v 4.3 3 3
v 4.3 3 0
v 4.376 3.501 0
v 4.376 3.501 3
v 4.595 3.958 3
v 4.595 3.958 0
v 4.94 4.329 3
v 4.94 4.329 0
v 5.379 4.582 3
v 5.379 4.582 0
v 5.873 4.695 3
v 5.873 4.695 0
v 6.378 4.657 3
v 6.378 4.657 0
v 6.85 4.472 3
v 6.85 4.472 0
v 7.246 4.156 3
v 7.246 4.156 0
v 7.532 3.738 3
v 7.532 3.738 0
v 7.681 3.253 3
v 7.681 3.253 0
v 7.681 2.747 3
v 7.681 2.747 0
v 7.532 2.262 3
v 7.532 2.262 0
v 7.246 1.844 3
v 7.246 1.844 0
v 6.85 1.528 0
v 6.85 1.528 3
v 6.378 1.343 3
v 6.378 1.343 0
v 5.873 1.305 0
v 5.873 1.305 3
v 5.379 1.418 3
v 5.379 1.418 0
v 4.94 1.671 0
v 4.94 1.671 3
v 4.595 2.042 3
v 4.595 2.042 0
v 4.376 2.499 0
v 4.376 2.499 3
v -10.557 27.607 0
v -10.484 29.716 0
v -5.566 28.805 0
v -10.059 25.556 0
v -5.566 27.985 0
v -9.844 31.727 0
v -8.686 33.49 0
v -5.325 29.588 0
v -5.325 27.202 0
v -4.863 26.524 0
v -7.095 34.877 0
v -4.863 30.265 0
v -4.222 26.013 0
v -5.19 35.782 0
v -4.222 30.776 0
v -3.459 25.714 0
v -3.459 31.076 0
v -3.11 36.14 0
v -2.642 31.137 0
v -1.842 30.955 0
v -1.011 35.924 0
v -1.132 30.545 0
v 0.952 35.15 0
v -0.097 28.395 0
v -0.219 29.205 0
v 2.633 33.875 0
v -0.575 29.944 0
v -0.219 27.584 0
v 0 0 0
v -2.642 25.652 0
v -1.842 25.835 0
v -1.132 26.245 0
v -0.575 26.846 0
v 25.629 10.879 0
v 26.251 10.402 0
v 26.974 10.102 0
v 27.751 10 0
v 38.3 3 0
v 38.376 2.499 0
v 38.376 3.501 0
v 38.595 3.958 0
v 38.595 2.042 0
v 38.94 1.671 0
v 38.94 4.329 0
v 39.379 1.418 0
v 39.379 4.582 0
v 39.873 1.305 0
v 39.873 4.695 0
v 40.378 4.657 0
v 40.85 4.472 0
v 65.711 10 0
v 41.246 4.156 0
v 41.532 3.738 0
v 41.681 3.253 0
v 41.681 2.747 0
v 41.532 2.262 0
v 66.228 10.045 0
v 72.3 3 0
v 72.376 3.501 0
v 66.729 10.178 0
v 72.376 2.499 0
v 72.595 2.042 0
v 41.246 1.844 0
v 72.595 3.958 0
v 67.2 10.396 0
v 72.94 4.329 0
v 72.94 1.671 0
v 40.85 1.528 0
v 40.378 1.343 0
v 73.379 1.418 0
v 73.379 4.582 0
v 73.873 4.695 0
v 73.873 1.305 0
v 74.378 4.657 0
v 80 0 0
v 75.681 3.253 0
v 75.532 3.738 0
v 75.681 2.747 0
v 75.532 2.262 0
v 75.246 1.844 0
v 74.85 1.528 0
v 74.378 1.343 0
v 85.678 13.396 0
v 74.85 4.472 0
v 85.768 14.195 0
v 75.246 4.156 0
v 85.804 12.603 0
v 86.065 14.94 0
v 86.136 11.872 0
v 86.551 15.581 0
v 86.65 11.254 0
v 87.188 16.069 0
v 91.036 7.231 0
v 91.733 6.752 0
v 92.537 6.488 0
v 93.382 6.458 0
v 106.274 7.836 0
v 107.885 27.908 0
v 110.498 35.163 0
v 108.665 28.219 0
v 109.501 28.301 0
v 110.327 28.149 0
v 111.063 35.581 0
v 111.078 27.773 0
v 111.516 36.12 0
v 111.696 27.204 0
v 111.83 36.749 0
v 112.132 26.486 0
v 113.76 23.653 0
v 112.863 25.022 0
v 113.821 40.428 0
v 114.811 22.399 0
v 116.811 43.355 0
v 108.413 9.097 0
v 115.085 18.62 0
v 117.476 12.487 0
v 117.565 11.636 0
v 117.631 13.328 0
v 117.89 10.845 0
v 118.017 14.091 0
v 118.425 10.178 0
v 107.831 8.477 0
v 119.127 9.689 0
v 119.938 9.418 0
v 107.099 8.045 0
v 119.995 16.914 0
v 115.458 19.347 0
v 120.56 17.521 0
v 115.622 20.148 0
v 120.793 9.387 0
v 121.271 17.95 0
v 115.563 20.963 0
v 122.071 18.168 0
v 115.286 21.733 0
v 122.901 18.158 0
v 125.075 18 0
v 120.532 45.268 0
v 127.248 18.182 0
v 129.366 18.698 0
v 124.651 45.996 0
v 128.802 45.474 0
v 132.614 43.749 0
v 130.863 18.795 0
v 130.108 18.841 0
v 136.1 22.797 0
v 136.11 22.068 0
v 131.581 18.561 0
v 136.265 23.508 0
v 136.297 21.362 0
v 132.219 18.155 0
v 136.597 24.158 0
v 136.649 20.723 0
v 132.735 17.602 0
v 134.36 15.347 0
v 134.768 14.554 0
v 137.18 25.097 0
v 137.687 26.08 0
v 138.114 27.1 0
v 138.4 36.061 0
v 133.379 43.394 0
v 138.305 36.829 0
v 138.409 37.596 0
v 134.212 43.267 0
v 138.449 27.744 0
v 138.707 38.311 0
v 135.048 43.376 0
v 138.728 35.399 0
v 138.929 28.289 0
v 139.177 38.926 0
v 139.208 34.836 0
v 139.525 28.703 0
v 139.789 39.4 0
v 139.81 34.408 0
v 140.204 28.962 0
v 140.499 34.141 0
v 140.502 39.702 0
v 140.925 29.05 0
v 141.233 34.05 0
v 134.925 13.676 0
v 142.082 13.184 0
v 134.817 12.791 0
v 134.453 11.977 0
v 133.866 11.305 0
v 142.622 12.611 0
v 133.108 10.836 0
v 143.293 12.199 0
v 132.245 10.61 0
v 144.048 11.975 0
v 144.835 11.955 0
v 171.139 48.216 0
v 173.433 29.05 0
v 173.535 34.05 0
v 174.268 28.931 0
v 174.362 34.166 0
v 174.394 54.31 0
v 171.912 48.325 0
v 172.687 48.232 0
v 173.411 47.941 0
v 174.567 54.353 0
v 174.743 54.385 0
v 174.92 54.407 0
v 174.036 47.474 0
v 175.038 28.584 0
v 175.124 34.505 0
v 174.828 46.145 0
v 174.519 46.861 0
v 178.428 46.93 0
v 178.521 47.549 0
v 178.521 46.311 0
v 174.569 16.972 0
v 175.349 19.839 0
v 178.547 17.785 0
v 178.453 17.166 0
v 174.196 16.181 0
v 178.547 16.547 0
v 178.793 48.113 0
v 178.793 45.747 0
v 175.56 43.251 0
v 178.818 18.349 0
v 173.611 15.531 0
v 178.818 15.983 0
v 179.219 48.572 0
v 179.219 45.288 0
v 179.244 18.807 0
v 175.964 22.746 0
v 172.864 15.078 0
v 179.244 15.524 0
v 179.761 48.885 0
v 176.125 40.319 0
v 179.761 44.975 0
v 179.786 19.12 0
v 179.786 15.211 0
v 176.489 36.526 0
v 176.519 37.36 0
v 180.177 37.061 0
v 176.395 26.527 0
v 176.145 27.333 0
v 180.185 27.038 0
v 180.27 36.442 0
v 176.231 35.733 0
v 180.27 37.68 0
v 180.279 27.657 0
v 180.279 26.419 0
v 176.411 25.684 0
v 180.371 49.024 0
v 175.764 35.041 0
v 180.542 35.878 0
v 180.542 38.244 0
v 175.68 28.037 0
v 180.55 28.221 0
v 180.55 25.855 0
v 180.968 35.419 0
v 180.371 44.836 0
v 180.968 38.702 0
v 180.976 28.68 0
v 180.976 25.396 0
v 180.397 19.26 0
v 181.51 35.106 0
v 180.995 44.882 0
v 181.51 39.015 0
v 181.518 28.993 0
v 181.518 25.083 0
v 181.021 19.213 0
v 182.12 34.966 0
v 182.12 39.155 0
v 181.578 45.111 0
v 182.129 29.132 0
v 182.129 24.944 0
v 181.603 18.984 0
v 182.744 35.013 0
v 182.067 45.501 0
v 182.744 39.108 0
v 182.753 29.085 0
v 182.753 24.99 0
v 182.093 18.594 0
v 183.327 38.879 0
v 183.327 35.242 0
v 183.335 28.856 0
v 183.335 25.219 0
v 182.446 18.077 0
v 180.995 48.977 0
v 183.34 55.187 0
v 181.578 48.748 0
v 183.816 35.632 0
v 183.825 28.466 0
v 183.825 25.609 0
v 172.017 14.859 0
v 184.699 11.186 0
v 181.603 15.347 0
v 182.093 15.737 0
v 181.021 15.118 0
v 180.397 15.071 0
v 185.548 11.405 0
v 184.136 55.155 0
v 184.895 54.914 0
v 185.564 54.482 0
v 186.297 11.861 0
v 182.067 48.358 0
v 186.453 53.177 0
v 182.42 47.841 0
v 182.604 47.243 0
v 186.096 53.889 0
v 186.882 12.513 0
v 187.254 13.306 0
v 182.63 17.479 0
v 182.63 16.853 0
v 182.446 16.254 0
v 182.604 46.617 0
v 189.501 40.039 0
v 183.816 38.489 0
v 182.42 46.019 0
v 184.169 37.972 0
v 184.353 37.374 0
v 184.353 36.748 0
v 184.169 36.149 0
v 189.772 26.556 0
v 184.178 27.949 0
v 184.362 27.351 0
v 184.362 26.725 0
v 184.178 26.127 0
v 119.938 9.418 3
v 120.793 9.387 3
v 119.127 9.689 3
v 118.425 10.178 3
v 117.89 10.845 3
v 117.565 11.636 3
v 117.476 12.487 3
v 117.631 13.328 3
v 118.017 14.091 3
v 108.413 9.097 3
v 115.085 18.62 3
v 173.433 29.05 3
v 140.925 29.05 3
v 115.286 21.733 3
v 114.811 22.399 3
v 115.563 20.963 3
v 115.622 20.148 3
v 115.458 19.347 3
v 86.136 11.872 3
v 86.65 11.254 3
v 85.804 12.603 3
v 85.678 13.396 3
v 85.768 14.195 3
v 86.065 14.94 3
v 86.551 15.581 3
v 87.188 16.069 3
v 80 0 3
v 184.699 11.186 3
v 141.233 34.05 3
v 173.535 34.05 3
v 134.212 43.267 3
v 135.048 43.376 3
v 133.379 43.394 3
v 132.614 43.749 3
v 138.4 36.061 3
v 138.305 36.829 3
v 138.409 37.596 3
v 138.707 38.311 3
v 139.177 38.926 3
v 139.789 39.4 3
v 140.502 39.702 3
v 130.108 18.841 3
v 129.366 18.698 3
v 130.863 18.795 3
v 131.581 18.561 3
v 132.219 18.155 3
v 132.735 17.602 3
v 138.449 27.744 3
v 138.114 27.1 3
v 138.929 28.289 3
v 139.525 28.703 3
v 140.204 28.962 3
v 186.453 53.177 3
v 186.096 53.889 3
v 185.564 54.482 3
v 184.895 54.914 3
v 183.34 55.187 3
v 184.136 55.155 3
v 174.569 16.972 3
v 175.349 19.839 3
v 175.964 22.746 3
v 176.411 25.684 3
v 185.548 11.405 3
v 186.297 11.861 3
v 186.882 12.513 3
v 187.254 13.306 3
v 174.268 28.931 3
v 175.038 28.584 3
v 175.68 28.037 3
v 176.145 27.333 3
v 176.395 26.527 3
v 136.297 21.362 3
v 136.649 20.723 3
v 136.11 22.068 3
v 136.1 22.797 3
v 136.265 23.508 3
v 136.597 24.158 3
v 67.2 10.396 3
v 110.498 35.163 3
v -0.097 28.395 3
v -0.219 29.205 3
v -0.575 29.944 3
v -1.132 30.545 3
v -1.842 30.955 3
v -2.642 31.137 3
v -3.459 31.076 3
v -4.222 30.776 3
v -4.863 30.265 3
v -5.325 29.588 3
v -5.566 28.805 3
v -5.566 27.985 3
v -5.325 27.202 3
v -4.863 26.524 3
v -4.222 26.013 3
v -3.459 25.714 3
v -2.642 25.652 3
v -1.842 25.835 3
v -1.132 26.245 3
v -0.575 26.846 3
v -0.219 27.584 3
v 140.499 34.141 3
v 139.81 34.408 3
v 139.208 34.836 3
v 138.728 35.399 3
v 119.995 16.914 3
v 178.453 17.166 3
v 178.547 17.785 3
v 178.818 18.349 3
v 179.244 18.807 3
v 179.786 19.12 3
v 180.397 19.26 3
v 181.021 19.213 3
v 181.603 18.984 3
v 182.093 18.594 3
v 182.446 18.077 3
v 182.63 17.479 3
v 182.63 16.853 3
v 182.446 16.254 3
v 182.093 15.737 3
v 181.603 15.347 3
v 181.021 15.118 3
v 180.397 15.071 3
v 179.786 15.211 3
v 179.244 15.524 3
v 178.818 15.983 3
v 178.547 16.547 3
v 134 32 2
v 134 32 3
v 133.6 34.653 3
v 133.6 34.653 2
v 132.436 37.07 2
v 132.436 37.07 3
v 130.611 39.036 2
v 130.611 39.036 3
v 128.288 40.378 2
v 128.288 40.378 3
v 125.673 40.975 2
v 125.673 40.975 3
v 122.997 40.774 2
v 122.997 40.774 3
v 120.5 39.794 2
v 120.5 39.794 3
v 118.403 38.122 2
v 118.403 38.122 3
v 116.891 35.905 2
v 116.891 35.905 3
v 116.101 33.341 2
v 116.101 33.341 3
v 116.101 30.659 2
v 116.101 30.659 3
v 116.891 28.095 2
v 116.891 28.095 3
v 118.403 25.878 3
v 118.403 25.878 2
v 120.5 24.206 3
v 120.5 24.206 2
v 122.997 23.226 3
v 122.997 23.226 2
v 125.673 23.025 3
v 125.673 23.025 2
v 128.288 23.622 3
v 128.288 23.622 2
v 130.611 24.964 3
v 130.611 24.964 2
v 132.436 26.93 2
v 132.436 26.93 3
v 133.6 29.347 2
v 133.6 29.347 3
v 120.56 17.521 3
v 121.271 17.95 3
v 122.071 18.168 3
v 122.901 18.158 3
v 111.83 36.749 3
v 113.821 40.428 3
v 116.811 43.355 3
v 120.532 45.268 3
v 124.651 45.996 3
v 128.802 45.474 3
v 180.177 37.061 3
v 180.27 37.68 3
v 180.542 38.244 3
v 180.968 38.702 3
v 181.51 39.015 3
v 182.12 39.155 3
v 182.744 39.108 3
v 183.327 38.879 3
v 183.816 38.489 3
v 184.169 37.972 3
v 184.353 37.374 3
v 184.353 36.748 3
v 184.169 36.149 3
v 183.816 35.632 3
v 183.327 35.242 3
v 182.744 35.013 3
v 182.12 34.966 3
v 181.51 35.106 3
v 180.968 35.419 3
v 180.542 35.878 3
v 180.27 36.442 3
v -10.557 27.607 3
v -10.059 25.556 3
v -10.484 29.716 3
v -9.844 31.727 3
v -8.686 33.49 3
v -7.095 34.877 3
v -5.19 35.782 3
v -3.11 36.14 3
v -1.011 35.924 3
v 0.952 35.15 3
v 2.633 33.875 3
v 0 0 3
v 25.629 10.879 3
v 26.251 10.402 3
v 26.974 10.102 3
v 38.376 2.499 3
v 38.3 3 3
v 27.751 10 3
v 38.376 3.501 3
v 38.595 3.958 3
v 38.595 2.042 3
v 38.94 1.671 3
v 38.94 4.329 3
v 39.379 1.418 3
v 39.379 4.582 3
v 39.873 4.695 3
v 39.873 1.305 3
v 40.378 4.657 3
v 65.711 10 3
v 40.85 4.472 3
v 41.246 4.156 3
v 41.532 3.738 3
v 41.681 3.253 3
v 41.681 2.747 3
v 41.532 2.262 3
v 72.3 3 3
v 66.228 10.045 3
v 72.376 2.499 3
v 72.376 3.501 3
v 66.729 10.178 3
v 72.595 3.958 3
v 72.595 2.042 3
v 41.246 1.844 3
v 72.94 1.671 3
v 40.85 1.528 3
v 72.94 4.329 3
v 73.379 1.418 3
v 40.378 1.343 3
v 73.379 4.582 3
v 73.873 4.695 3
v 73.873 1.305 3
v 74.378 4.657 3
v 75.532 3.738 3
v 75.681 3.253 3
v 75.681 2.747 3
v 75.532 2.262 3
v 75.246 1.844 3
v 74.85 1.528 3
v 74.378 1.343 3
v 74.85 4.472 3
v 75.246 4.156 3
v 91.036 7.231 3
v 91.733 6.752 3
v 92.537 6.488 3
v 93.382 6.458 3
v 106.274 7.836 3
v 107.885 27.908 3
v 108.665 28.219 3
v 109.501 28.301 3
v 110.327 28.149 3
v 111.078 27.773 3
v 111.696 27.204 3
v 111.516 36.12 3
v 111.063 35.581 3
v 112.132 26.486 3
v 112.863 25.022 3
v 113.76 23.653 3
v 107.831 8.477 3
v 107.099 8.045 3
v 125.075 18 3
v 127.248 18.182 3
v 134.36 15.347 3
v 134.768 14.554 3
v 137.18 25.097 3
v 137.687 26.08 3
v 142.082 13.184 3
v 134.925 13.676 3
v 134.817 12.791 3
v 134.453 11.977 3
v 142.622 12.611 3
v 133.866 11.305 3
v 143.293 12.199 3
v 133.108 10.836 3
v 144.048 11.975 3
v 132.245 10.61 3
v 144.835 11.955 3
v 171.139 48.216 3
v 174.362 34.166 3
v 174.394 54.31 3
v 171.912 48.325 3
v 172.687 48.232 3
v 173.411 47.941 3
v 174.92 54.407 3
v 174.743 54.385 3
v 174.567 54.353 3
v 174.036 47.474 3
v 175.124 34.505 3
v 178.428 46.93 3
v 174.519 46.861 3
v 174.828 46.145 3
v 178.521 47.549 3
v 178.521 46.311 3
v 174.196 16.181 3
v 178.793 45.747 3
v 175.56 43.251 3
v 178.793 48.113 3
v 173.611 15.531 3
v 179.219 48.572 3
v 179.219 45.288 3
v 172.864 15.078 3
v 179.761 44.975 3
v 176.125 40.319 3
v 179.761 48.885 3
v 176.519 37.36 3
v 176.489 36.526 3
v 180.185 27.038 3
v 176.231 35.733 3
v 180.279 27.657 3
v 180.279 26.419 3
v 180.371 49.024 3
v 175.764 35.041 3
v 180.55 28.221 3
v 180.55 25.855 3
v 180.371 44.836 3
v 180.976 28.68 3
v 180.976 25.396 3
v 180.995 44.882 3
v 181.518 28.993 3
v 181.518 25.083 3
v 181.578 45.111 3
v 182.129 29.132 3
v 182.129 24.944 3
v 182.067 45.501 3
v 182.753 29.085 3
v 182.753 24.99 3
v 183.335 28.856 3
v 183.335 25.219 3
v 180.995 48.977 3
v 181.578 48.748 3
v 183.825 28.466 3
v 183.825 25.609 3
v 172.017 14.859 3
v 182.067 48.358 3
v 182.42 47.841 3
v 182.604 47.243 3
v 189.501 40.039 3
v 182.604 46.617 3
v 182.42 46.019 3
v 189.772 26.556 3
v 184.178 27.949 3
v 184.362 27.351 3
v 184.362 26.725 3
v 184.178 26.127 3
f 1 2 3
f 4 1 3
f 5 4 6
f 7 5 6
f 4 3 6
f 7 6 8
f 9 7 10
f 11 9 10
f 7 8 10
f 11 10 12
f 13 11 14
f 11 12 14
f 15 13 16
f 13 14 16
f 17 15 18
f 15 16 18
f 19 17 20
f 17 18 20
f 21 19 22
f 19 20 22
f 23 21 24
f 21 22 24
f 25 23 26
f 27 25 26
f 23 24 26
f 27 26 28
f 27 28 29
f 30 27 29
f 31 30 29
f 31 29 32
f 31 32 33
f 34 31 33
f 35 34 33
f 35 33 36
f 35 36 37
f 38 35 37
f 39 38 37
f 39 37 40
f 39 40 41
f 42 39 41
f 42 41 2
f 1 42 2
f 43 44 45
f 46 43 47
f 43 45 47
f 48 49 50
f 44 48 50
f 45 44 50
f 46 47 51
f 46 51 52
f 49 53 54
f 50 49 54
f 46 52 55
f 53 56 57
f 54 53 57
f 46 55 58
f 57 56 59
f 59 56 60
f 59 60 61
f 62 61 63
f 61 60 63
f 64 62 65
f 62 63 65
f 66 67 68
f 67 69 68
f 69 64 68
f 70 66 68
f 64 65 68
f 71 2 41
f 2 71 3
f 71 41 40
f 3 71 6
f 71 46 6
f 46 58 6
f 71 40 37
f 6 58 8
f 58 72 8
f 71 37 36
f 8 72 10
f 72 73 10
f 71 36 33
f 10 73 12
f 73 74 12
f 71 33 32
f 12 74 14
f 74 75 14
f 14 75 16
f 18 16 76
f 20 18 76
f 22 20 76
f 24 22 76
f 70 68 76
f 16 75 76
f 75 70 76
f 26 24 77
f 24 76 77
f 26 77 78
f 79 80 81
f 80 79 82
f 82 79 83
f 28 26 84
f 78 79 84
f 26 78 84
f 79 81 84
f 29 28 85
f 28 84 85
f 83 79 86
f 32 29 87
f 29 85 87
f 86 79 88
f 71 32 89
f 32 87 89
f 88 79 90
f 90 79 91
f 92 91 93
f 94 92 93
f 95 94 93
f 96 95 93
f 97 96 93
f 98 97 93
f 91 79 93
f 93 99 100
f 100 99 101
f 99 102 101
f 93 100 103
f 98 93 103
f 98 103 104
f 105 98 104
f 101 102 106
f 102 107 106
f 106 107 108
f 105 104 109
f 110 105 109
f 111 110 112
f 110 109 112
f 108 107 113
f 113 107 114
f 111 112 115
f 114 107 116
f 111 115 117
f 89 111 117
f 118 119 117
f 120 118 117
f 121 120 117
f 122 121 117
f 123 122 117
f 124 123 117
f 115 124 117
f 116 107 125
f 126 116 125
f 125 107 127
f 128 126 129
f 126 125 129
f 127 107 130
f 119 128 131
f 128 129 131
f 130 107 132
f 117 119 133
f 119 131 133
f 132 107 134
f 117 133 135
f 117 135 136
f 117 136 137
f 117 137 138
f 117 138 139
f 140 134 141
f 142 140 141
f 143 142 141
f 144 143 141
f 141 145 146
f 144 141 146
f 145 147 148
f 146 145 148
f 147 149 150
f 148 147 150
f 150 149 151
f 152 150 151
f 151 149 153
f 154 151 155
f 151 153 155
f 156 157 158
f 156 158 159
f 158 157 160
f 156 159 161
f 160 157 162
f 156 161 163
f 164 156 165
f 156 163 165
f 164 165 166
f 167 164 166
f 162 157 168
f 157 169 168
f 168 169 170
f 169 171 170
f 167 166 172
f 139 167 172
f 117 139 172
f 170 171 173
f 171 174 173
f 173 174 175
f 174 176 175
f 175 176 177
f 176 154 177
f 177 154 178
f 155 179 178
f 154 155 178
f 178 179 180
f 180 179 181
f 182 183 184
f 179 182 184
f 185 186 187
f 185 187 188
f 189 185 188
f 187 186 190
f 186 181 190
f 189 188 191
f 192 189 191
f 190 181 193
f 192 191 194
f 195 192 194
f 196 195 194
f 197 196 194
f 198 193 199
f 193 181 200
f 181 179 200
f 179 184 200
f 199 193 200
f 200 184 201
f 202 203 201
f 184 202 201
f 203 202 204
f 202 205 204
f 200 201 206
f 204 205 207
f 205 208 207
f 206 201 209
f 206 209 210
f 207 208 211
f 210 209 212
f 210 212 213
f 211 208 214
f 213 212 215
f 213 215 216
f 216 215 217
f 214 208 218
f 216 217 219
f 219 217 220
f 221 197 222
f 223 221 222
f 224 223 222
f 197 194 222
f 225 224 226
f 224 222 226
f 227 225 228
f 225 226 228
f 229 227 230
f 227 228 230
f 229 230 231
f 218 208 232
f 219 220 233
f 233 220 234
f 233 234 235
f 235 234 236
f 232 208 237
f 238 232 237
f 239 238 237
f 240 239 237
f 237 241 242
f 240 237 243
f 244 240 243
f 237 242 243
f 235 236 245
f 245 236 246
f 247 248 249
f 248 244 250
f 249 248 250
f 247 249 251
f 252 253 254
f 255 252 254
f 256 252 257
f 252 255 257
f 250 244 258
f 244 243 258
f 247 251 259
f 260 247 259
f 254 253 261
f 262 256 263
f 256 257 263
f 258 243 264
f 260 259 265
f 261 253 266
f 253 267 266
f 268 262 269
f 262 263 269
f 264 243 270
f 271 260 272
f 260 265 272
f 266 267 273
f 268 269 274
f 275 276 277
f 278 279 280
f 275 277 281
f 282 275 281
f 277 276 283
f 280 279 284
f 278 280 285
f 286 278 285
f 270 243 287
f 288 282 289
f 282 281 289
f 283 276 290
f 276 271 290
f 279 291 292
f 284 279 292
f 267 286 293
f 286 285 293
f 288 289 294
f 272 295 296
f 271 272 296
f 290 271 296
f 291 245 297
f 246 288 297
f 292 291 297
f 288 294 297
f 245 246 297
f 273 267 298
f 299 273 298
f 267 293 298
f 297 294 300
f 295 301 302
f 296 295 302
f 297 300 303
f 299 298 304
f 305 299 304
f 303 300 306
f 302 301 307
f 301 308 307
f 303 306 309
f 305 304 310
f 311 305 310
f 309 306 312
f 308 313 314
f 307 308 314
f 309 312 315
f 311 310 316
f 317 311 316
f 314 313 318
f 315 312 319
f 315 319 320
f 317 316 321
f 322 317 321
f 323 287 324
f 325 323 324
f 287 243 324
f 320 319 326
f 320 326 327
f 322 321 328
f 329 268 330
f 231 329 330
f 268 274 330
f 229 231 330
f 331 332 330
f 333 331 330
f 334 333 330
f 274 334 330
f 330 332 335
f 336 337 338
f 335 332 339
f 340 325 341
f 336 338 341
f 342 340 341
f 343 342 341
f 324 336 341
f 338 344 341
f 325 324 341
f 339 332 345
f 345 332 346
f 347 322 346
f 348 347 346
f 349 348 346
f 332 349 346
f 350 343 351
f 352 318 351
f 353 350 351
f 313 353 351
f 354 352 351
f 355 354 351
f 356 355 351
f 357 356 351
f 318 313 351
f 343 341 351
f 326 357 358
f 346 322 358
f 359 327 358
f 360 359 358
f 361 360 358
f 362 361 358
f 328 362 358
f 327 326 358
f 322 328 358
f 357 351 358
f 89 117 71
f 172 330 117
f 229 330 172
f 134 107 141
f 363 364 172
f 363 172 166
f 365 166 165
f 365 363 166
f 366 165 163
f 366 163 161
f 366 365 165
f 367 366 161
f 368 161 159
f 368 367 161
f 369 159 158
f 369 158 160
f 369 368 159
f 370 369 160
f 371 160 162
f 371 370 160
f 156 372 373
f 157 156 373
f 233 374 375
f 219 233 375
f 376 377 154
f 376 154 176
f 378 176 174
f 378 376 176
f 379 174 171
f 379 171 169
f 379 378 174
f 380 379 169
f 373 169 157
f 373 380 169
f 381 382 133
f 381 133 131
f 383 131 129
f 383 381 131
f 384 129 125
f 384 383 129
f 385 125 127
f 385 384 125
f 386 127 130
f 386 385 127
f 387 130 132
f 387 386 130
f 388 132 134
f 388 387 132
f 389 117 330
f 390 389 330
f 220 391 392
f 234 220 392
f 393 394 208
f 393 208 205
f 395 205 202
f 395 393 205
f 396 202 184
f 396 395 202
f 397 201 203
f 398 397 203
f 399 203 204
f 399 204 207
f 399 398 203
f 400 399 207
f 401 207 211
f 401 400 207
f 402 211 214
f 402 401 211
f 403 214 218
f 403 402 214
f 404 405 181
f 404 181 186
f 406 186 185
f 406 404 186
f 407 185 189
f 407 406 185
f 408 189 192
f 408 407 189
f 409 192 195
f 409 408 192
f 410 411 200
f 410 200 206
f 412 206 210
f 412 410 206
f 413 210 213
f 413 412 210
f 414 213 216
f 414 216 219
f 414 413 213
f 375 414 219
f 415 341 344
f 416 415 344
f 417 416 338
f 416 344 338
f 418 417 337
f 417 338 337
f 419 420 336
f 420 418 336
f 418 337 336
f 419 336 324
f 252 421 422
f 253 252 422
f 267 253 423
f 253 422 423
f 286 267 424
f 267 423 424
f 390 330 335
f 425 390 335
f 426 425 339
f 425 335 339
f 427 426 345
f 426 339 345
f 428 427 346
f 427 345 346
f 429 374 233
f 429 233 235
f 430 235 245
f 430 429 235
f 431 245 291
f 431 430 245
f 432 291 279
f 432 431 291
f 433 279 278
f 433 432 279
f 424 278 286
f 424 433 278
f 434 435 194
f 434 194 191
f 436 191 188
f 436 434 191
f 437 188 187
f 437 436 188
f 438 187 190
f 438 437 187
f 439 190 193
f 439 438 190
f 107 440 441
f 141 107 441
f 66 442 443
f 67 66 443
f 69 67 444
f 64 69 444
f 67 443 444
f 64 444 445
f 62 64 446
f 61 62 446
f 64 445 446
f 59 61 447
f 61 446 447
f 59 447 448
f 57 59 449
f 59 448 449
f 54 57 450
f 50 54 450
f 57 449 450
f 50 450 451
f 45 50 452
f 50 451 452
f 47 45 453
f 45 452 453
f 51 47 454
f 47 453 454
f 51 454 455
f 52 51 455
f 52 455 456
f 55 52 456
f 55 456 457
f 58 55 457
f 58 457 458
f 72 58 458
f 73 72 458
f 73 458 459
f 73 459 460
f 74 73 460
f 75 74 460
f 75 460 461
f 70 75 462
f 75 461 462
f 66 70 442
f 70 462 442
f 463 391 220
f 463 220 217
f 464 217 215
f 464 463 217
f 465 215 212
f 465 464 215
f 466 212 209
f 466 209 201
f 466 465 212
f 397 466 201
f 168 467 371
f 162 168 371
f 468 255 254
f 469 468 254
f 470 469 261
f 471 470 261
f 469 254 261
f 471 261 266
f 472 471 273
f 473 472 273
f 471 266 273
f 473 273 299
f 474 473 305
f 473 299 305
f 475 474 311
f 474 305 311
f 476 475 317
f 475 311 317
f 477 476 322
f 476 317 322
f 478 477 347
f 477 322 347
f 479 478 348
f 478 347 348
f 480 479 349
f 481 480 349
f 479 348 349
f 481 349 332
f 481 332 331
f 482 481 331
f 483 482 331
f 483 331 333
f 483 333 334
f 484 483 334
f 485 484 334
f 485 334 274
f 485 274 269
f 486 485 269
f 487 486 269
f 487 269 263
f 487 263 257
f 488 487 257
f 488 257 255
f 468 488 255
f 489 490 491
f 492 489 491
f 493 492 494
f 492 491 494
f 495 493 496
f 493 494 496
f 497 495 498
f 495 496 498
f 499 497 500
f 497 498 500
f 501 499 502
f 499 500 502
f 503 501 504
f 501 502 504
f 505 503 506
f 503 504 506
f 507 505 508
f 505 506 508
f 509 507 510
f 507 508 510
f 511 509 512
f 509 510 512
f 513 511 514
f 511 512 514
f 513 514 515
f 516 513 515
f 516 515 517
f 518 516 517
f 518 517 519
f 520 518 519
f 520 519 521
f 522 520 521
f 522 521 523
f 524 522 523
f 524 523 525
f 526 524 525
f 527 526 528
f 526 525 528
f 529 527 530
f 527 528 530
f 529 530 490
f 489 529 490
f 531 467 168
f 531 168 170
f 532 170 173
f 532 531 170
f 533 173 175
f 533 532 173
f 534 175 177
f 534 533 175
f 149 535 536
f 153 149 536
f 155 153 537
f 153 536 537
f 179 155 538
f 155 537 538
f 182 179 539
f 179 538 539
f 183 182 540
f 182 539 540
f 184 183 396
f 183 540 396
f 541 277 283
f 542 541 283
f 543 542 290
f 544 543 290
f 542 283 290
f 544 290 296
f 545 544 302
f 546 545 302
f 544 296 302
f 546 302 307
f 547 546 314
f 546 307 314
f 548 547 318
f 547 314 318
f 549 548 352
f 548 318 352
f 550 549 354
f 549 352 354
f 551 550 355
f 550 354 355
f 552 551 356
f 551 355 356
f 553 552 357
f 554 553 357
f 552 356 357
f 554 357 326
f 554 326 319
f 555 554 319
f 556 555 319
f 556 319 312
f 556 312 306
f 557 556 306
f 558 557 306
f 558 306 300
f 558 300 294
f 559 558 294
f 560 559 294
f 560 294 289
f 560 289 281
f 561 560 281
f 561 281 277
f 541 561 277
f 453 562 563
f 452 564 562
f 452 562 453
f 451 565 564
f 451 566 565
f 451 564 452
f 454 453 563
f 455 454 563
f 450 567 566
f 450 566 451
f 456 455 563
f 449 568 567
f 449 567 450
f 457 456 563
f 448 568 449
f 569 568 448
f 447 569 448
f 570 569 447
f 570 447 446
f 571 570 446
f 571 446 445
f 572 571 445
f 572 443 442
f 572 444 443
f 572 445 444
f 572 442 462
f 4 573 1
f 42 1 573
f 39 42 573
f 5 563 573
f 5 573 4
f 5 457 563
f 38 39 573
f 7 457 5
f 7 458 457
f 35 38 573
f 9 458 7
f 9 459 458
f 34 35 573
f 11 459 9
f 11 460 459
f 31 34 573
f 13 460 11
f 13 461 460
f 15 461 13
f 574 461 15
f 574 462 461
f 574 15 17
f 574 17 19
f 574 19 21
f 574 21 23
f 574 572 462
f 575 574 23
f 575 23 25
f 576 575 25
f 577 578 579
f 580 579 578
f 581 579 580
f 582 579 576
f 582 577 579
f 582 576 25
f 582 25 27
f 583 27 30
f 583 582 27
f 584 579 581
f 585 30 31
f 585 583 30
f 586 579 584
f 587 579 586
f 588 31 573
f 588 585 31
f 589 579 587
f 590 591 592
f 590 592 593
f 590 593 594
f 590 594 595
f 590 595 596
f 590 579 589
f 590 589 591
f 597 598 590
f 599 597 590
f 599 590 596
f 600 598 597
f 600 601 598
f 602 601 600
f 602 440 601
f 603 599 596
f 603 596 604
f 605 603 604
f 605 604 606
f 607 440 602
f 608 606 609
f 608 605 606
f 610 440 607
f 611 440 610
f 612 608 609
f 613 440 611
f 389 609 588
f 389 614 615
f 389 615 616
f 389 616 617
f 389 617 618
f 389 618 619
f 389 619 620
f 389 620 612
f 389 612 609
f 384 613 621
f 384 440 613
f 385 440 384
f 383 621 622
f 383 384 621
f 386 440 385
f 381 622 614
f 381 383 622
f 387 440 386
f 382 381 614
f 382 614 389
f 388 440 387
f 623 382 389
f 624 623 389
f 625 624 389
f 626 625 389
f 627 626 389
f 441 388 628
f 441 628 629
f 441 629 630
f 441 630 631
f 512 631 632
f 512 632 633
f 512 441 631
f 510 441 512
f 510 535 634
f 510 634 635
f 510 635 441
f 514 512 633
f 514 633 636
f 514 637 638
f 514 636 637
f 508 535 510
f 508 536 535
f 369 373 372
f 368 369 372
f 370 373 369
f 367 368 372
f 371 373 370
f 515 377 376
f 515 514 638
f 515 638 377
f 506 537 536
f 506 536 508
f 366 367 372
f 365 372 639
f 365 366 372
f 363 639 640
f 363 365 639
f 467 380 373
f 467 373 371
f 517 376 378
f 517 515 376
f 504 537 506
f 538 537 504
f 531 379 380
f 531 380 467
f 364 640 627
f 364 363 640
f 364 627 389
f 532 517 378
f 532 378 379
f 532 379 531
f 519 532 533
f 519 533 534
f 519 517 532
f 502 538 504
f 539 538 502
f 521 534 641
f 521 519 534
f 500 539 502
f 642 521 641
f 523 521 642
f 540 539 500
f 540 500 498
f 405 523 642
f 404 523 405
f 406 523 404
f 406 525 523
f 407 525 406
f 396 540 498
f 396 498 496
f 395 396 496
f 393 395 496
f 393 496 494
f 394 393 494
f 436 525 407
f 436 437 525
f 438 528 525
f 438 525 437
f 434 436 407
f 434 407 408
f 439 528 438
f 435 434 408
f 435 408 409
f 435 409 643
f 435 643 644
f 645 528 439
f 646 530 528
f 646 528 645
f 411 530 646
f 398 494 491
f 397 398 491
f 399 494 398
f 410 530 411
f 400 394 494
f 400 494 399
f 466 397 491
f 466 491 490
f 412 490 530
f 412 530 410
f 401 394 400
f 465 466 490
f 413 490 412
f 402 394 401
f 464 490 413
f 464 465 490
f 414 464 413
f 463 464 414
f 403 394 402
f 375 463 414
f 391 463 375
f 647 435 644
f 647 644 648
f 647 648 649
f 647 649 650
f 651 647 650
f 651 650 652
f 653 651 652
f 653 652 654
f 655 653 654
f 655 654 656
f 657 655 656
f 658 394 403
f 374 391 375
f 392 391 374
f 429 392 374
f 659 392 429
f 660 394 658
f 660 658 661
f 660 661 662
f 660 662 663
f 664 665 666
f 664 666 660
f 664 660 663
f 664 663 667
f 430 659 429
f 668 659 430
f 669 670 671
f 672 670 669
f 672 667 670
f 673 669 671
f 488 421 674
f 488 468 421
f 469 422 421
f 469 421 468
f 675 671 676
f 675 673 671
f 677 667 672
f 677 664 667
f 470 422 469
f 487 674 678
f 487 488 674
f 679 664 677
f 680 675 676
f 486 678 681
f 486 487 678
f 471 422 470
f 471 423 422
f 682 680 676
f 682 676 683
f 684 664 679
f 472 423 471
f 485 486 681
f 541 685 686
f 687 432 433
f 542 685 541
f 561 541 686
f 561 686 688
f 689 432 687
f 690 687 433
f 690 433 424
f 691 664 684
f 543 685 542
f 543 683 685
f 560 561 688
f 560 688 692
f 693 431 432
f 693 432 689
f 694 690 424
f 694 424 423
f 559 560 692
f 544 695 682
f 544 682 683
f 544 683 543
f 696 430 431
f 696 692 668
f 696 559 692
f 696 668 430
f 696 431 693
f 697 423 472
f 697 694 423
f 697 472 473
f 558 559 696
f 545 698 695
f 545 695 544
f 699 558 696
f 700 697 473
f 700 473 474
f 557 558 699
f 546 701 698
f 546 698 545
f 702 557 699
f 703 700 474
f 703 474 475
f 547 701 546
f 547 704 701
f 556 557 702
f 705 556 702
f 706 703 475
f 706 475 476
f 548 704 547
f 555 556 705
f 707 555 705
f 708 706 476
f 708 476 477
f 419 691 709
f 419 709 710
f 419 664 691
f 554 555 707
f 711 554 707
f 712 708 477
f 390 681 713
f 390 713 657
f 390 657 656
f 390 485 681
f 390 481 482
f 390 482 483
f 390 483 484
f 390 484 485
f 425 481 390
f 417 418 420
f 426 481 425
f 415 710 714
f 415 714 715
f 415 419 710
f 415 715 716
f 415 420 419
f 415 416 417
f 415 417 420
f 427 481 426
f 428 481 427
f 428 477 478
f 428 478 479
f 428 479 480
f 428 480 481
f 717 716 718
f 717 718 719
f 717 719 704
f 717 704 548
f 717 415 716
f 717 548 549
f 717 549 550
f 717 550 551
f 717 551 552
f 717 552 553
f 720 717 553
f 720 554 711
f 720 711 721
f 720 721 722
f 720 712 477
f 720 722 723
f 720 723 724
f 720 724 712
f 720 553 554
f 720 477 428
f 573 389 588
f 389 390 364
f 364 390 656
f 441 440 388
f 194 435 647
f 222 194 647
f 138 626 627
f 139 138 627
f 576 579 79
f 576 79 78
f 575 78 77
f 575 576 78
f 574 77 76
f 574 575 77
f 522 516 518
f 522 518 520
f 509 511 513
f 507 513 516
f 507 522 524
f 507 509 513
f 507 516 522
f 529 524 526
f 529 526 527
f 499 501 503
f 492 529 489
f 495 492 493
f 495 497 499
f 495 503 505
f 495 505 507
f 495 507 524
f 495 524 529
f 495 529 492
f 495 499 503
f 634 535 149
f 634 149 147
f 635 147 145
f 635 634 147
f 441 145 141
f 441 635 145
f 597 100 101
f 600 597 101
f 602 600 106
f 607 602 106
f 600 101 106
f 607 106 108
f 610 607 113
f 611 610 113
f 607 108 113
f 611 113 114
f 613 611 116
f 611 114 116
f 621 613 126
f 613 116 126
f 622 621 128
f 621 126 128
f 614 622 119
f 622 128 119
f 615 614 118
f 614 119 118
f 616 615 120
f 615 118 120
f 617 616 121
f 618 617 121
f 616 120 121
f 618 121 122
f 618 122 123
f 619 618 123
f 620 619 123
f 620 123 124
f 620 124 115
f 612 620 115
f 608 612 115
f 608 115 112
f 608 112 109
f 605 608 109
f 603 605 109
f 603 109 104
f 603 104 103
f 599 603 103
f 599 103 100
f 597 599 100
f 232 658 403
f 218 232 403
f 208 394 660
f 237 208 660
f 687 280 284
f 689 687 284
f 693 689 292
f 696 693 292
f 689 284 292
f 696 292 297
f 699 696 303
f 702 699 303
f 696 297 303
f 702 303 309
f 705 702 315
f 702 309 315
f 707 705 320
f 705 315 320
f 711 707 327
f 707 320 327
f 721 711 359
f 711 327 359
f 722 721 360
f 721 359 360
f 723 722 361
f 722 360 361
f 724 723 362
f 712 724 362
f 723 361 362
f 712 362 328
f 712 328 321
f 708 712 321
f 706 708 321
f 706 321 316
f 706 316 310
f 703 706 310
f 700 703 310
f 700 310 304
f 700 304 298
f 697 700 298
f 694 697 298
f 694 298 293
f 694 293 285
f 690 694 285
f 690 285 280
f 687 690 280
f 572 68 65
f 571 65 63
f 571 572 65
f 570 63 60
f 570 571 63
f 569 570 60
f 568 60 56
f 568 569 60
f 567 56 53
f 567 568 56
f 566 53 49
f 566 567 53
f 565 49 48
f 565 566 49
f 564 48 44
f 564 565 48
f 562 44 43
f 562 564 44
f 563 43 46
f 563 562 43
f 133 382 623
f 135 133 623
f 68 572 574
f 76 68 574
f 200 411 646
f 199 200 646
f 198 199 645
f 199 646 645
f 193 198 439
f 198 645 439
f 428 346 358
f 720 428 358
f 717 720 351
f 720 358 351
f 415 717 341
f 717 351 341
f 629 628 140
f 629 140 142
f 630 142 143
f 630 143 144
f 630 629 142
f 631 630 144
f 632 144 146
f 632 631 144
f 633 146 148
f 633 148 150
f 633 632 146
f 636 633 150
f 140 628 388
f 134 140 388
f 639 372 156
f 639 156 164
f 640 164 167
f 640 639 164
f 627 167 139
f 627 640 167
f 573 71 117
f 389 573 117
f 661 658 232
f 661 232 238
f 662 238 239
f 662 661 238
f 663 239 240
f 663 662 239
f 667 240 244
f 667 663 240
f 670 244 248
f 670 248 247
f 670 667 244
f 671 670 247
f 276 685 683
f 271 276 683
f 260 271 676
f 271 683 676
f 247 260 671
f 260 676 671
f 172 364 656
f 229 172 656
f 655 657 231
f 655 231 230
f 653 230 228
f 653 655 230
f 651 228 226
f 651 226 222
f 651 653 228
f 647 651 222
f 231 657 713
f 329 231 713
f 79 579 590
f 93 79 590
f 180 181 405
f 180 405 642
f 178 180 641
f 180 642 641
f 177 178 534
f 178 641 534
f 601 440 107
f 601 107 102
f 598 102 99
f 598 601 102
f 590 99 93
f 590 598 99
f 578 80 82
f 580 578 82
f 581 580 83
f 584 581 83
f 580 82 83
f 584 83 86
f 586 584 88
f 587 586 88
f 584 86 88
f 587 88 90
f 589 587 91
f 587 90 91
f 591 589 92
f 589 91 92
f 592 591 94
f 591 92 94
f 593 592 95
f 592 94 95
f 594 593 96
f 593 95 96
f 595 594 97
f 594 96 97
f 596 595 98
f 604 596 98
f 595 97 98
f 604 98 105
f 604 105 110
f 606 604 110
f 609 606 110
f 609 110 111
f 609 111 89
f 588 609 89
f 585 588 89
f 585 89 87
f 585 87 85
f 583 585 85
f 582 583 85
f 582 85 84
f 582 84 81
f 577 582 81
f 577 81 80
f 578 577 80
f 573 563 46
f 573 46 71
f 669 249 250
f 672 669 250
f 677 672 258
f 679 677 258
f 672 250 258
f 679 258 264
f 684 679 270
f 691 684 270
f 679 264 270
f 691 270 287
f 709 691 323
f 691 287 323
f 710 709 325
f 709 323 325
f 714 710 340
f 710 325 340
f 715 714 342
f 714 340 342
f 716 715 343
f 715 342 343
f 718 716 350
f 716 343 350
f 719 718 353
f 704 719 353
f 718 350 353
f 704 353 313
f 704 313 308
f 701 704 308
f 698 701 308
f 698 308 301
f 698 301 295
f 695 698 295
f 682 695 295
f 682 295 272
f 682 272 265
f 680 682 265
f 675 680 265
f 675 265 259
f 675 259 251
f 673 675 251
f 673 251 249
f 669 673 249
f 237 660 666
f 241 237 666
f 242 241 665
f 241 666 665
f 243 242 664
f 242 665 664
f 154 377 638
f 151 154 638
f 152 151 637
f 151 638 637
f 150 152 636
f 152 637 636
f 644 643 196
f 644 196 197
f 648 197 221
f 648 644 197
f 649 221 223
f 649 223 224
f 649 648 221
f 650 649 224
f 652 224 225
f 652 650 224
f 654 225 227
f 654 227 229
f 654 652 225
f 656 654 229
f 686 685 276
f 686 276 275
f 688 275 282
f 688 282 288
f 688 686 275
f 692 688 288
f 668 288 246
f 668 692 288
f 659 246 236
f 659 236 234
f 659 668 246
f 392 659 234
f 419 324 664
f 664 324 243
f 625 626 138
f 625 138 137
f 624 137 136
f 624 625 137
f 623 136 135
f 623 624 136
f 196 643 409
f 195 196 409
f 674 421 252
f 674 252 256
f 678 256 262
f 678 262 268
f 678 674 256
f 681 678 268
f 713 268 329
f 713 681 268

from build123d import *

# Parameters (mm, degrees)
EXTRUDE_1_DEPTH     = 3
HOLE_WIZARD_M31_D   = 3.4
SKETCH_5_R          = 2.749999999999999
EXTRUDE_2_DEPTH     = 3
CUT_EXTRUDE_1_DEPTH = 198.9348007797117
M5X0_81_D           = 4.2
CUT_EXTRUDE_2_DEPTH = 198.9348007797117
CUT_EXTRUDE_3_DEPTH = 198.9348007797117
FILLET_1_R          = 3
SKETCH_12_R         = 8.999999999999996
CUT_EXTRUDE_4_DEPTH = 1


with BuildPart() as part:
    # Эскиз1 → Бобышка-Вытянуть1 (new body)
    with BuildSketch(Plane.XY):
        with BuildLine():
            Line((0, 0), (80, 0))
            Line((80, 0), (186.64735263363326, 11.394080625595256))
            ThreePointArc((186.64735263363326, 11.394080625595256), (189.98303763522418, 33.48486352875775), (185.64181138843185, 55.40022887772366))
            Line((185.64181138843185, 55.40022887772366), (29.81788185582472, 40.959090919498855))
            Line((29.81788185582472, 40.959090919498855), (1.6e-16, 40.959090919498855))
            Line((1.6e-16, 40.959090919498855), (0, 0))
        make_face()
    extrude(amount=EXTRUDE_1_DEPTH)

    # Отверстие с зазором M31 (through all)
    with Locations(Plane.XY.offset(3)):
        with Locations((6, 3), (40, 3), (74, 3)):
            Hole(HOLE_WIZARD_M31_D / 2)

    # Эскиз5 → Бобышка-Вытянуть2 (add)
    with BuildSketch(Plane.XY.offset(3)):
        with BuildLine():
            Line((-10.05858051013897, 25.55645888767347), (0, 0))
            Line((0, 0), (0, 21.18668565496398))
            ThreePointArc((0, 21.18668565496398), (0.24099496955508215, 35.503000018294074), (-10.05858051013897, 25.55645888767347))
        make_face()
        with Locations((-2.8470386460772503, 28.39479712384004)):
            Circle(SKETCH_5_R, mode=Mode.SUBTRACT)
    extrude(amount=-EXTRUDE_2_DEPTH)

    # Эскиз6 → Вырез-Вытянуть1 (cut, through all)
    with BuildSketch(Plane.XY.offset(3)):
        with BuildLine():
            Line((2.6330389081184924, 33.874874678035766), (26.507913586154185, 10.000000000000002))
            Line((26.507913586154185, 10.000000000000002), (66.50791358615419, 10))
            Line((66.50791358615419, 10), (104.37682925914895, 47.8689156729949))
            Line((104.37682925914895, 47.8689156729949), (29.817881855824798, 40.95909091949886))
            Line((29.817881855824798, 40.95909091949886), (1.6e-16, 40.959090919498855))
            Line((1.6e-16, 40.959090919498855), (0, 35.60290859271609))
            ThreePointArc((0, 35.60290859271609), (1.4052244403019993, 34.874053149358424), (2.6330389081184924, 33.874874678035766))
        make_face()
    extrude(amount=-CUT_EXTRUDE_1_DEPTH, mode=Mode.SUBTRACT)

    # Отверстие обработанное метчиком M5x0.81 (through all)
    with Locations(Plane.XY.offset(3)):
        with Locations((180.527942872, 46.929754199), (182.276873258, 37.060611597), (182.285474835, 27.037704871), (180.553486246, 17.165574973)):
            Hole(M5X0_81_D / 2)

    # Эскиз10 → Вырез-Вытянуть2 (cut, through all)
    with BuildSketch(Plane.XY.offset(3)):
        with BuildLine():
            Line((66.50791358615419, 10), (111.50918528954904, 35.741379217384946))
            ThreePointArc((111.50918528954904, 35.741379217384946), (120.64604118056285, 45.30575223723353), (133.66945767503876, 42.9927477739058))
            Line((133.66945767503876, 42.9927477739058), (174.65262323365093, 54.38179491403086))
            Line((174.65262323365093, 54.38179491403086), (104.37682925914895, 47.8689156729949))
            Line((104.37682925914895, 47.8689156729949), (66.50791358615419, 10))
        make_face()
    extrude(amount=-CUT_EXTRUDE_2_DEPTH, mode=Mode.SUBTRACT)

    # Эскиз11 → Вырез-Вытянуть3 (cut, through all)
    with BuildSketch(Plane.XY.offset(3)):
        with BuildLine():
            Line((92.03441017428995, 6.314197935775633), (107.63021765734568, 7.980436088856215))
            Line((107.63021765734568, 7.980436088856215), (116.60825973560767, 20.79380995453953))
            ThreePointArc((116.60825973560767, 20.79380995453953), (113.01565006615179, 24.762917945534056), (111.17548635848748, 29.790289028937345))
            Line((111.17548635848748, 29.790289028937345), (83.6237542782258, 14.03029921690936))
            Line((83.6237542782258, 14.03029921690936), (92.03441017428995, 6.314197935775633))
        make_face()
        with BuildLine():
            Line((173.93078584223207, 48.99172434981097), (137.24012127463044, 38.79554495109394))
            ThreePointArc((137.24012127463044, 38.79554495109394), (138.25871477406997, 36.49516212609262), (138.84915367150305, 34.04962010701802))
            Line((138.84915367150305, 34.04962010701802), (176.75654119949715, 34.04962010701802))
            ThreePointArc((176.75654119949715, 34.04962010701802), (175.8950005059697, 41.62493755905363), (173.93078584223207, 48.99172434981097))
        make_face()
        with BuildLine():
            Line((121.13678636305278, 18.543567322826398), (114.22945460790407, 8.685490982627265))
            Line((114.22945460790407, 8.685490982627265), (137.37877384972535, 11.158737653597806))
            Line((137.37877384972535, 11.158737653597806), (131.35012272889716, 19.52298347648991))
            ThreePointArc((131.35012272889716, 19.52298347648991), (126.33641056880738, 18.063931444213534), (121.13678636305278, 18.543567322826398))
        make_face()
        with BuildLine():
            Line((143.10149490164468, 11.770146595809063), (173.95081110549165, 15.066052095485405))
            ThreePointArc((173.95081110549165, 15.066052095485405), (175.8152185482702, 21.96236763923512), (176.7130134299426, 29.049620107018022))
            Line((176.7130134299426, 29.049620107018022), (138.68558579261725, 29.049620107018022))
            ThreePointArc((138.68558579261725, 29.049620107018022), (137.43996226457978, 25.57759088380138), (135.33074101249935, 22.551413326181333))
            Line((135.33074101249935, 22.551413326181333), (143.10149490164468, 11.770146595809063))
        make_face()
    extrude(amount=-CUT_EXTRUDE_3_DEPTH, mode=Mode.SUBTRACT)

    # Скругление1
    # the kernel refuses this fillet: 3 mm, written as the material it adds along each edge
    with BuildSketch(Plane(origin=(133.66945767503876, 42.992747773905805, 3), x_dir=(-0.8130725400087585, 0.5821623868678788, 0), z_dir=(0, 0, -1))) as fillet_1_piece_1:
        with BuildLine():
            CenterArc((1.4378103136794376, 2.996771470104822), FILLET_1_R, 218.86683700391524, 48.47477501487009)
            Line((-0.8980091423480934, 1.1142339621535844), (0, 0))
            ThreePointArc((0, 0), (0.6493336900487631, 0.01506647284415901), (1.2986673800975244, 0))
        make_face()
    extrude(amount=3)
    with BuildSketch(Plane(origin=(111.50918528954904, 35.741379217384946, 3), x_dir=(-0.8680239741683529, -0.49652228577273216, 0), z_dir=(0, 0, -1))) as fillet_1_piece_2:
        with BuildLine():
            CenterArc((1.16542958022559, 2.9999999999999964), FILLET_1_R, 229.5997180782211, 40.4002819217792)
            ThreePointArc((-0.7789413643040896, 0.7153946445679564), (-0.382712836911811, 0.3650554500406897), (0, 0))
            Line((0, 0), (1.165429580225606, 1e-17))
        make_face()
    extrude(amount=3)
    with BuildSketch(Plane(origin=(92.03441017428995, 6.314197935775633, 3), x_dir=(0.9943411291859616, 0.10623426381910231, 0), z_dir=(0, 0, -1))) as fillet_1_piece_3:
        with BuildLine():
            CenterArc((FILLET_1_R * 0.451855277113, -FILLET_1_R), FILLET_1_R, 89.9999999999999, 48.632165419305906)
            Line((-FILLET_1_R * 0.298626929798, -FILLET_1_R * 0.339109345572), (0, 0))
            Line((0, 0), (FILLET_1_R * 0.451855277113, -1e-17))
        make_face()
    extrude(amount=3)
    with BuildSketch(Plane(origin=(83.6237542782258, 14.03029921690936, 3), x_dir=(0.8680239741683552, 0.496522285772728, 0), z_dir=(0, 0, -1))) as fillet_1_piece_4:
        with BuildLine():
            CenterArc((FILLET_1_R * 1.36872958736, FILLET_1_R), FILLET_1_R, 162.30406475526607, 107.69593524473399)
            Line((FILLET_1_R * 0.416046539376, FILLET_1_R * 1.30396547515), (0, 0))
            Line((0, 0), (FILLET_1_R * 1.36872958736, -5e-17))
        make_face()
    extrude(amount=3)
    with BuildSketch(Plane(origin=(111.17548635848748, 29.790289028937345, 3), x_dir=(0.2779694371109165, -0.960589918764631, 0), z_dir=(0, 0, -1))) as fillet_1_piece_5:
        with BuildLine():
            CenterArc((3.8089394275276667, 2.977268689428244), FILLET_1_R, 166.36886991345514, 96.57341947464624)
            Line((0.893440130163459, 3.684279189398942), (0, 0))
            ThreePointArc((0, 0), (1.720166193077011, 0.10607944933485743), (3.4403323861540267, -8e-17))
        make_face()
    extrude(amount=3)
    with BuildSketch(Plane(origin=(116.60825973560767, 20.79380995453953, 3), x_dir=(-0.5738346401441979, -0.8189711873873091, 0), z_dir=(0, 0, -1))) as fillet_1_piece_6:
        with BuildLine():
            CenterArc((2.6548645047083914, 3.0000000000000018), FILLET_1_R, 191.68179125859942, 78.31820874140055)
            ThreePointArc((-0.28299711772598396, 2.392571742979232), (-0.08993594197380265, 1.2023847782433434), (0, 0))
            Line((0, 0), (2.654864504708389, 0))
        make_face()
    extrude(amount=3)
    with BuildSketch(Plane(origin=(107.63021765734568, 7.980436088856215, 3), x_dir=(-0.9943411291859616, -0.10623426381910264, 0), z_dir=(0, 0, -1))) as fillet_1_piece_7:
        with BuildLine():
            CenterArc((FILLET_1_R * 0.4545006609, FILLET_1_R), FILLET_1_R, 221.11634455075327, 48.883655449246646)
            Line((-FILLET_1_R * 0.298875173788, FILLET_1_R * 0.342409814772), (0, 0))
            Line((0, 0), (FILLET_1_R * 0.4545006609, 0))
        make_face()
    extrude(amount=3)
    with BuildSketch(Plane(origin=(137.37877384972535, 11.158737653597806, 3), x_dir=(-0.9943411291859617, -0.10623426381910242, 0), z_dir=(0, 0, -1))) as fillet_1_piece_8:
        with BuildLine():
            CenterArc((FILLET_1_R * 1.72108797237, FILLET_1_R), FILLET_1_R, 150.3155592750541, 119.68444072494606)
            Line((FILLET_1_R * 0.852321942917, FILLET_1_R * 1.49522276409), (0, 0))
            Line((0, 0), (FILLET_1_R * 1.72108797237, -6e-17))
        make_face()
    extrude(amount=3)
    with BuildSketch(Plane(origin=(114.22945460790407, 8.685490982627265, 3), x_dir=(0.5738346401441975, 0.8189711873873095, 0), z_dir=(0, 0, -1))) as fillet_1_piece_9:
        with BuildLine():
            CenterArc((FILLET_1_R * 2.20021682261, FILLET_1_R), FILLET_1_R, 138.8836554492469, 131.11634455075307)
            Line((FILLET_1_R * 1.44684098792, FILLET_1_R * 1.65759018523), (0, 0))
            Line((0, 0), (FILLET_1_R * 2.20021682261, 2e-17))
        make_face()
    extrude(amount=3)
    with BuildSketch(Plane(origin=(121.13678636305278, 18.543567322826398, 3), x_dir=(-0.5738346401441984, -0.8189711873873087, 0), z_dir=(0, 0, -1))) as fillet_1_piece_10:
        with BuildLine():
            CenterArc((1.990265982493936, -3.0000000000000013), FILLET_1_R, 89.99999999999993, 63.60335445318877)
            ThreePointArc((-0.6969473887897009, -1.666251786432529), (-0.32157533753284756, -0.844376737614642), (0, 0))
            Line((0, 0), (1.9902659824939402, 5e-17))
        make_face()
    extrude(amount=3)
    with BuildSketch(Plane(origin=(131.35012272889716, 19.522983476489905, 3), x_dir=(0.5847130820131278, -0.8112401689528875, 0), z_dir=(0, 0, -1))) as fillet_1_piece_11:
        with BuildLine():
            CenterArc((2.3682065417982856, 3.0000000000000004), FILLET_1_R, 197.6131255819165, 72.3868744180835)
            ThreePointArc((-0.4911575816723561, 2.0922352675891354), (-0.20537262369653822, 1.0555561343908344), (0, 0))
            Line((0, 0), (2.368206541798286, 1e-17))
        make_face()
    extrude(amount=3)
    with BuildSketch(Plane(origin=(173.93078584223207, 48.99172434981097, 3), x_dir=(-0.9634885943550286, -0.26774937637232876, 0), z_dir=(0, 0, -1))) as fillet_1_piece_12:
        with BuildLine():
            CenterArc((2.897416461846995, -3.0000000000000013), FILLET_1_R, 90.00000000000013, 89.6828037551533)
            ThreePointArc((-0.1025375653525866, -2.9833917282944458), (-0.07276547265506263, -1.4909570345015974), (0, 0))
            Line((0, 0), (2.8974164618469884, -5e-17))
        make_face()
    extrude(amount=3)
    with BuildSketch(Plane(origin=(176.75654119949715, 34.04962010701802, 3), x_dir=(-1, 0, 0), z_dir=(0, 0, -1))) as fillet_1_piece_13:
        with BuildLine():
            CenterArc((3.221407714928148, 3), FILLET_1_R, 174.06028761643057, 95.93971238356943)
            ThreePointArc((0.23751372052348074, 3.310445857043881), (0.09223500645424565, 1.6571257852503223), (0, 0))
            Line((0, 0), (3.221407714928148, 0))
        make_face()
    extrude(amount=3)
    with BuildSketch(Plane(origin=(138.84915367150305, 34.04962010701802, 3), x_dir=(-0.22238352713061194, 0.9749592642059198, 0), z_dir=(0, 0, -1))) as fillet_1_piece_14:
        with BuildLine():
            CenterArc((2.394810958848804, 2.9910348047399777), FILLET_1_R, 192.84906769128517, 72.72030630224907)
            Line((-0.5300668337689619, 2.32388422334817), (0, 0))
            ThreePointArc((0, 0), (1.081527529802683, 0.04183757788016305), (2.163055059605388, 0))
        make_face()
    extrude(amount=3)
    with BuildSketch(Plane(origin=(137.24012127463044, 38.79554495109394, 3), x_dir=(0.9634885943550292, 0.2677493763723269, 0), z_dir=(0, 0, -1))) as fillet_1_piece_15:
        with BuildLine():
            CenterArc((3.3851332754644625, 3.0000000000000013), FILLET_1_R, 179.08948046092507, 90.91051953907493)
            ThreePointArc((0.3855120801952658, 3.047672684965048), (0.27660128884680796, 1.5132304278712665), (0, 0))
            Line((0, 0), (3.3851332754644634, 6e-17))
        make_face()
    extrude(amount=3)
    with BuildSketch(Plane(origin=(143.10149490164468, 11.770146595809063, 3), x_dir=(0.9943411291859617, 0.10623426381910227, 0), z_dir=(0, 0, -1))) as fillet_1_piece_16:
        with BuildLine():
            CenterArc((FILLET_1_R * 0.581027824292, -FILLET_1_R), FILLET_1_R, 90.00000000000017, 60.3155592750542)
            Line((-FILLET_1_R * 0.287738205159, -FILLET_1_R * 0.50477723591), (0, 0))
            Line((0, 0), (FILLET_1_R * 0.581027824292, -1e-17))
        make_face()
    extrude(amount=3)
    with BuildSketch(Plane(origin=(135.33074101249935, 22.551413326181333, 3), x_dir=(0.6191906205716086, 0.7852407117541386, 0), z_dir=(0, 0, -1))) as fillet_1_piece_17:
        with BuildLine():
            CenterArc((2.264587612579221, 2.9919845725048013), FILLET_1_R, 195.96022348085205, 69.85051867741447)
            Line((-0.6197708484362799, 2.1670747178126035), (0, 0))
            ThreePointArc((0, 0), (1.0227169863260859, 0.03740532831092148), (2.0454339726521837, 5e-17))
        make_face()
    extrude(amount=3)
    with BuildSketch(Plane(origin=(138.68558579261725, 29.049620107018022, 3), x_dir=(1, 0, 0), z_dir=(0, 0, -1))) as fillet_1_piece_18:
        with BuildLine():
            CenterArc((2.239017157823781, 3), FILLET_1_R, 200.4886819411101, 69.51131805888991)
            ThreePointArc((-0.5712068922540539, 1.9499329600620143), (-0.2501815737843174, 0.9853428458000373), (0, 0))
            Line((0, 0), (2.239017157823781, 0))
        make_face()
    extrude(amount=3)
    with BuildSketch(Plane(origin=(176.7130134299426, 29.049620107018022, 3), x_dir=(-0.08949841173945887, -0.9959869649227917, 0), z_dir=(0, 0, -1))) as fillet_1_piece_19:
        with BuildLine():
            CenterArc((3.2815211967518683, 2.998403344451645), FILLET_1_R, 174.86524824854192, 97.00415022459947)
            Line((0.29356030198349303, 3.266898579670022), (0, 0))
            ThreePointArc((0, 0), (1.6896926532610193, -0.02756738048459419), (3.37938530652206, -2e-17))
        make_face()
    extrude(amount=3)
    with BuildSketch(Plane(origin=(173.95081110549165, 15.066052095485404, 3), x_dir=(-0.994341129185962, -0.1062342638191007, 0), z_dir=(0, 0, -1))) as fillet_1_piece_20:
        with BuildLine():
            CenterArc((1.944914405279492, 2.9999999999999996), FILLET_1_R, 202.9640654934915, 67.03593450650857)
            ThreePointArc((-0.8173347828283964, 1.8295387991063596), (-0.41751534735678364, 0.9108166317013427), (0, 0))
            Line((0, 0), (1.944914405279496, -1e-17))
        make_face()
    extrude(amount=3)
    with BuildSketch(Plane(origin=(66.50791358615419, 10, 3), x_dir=(-1, 0, 0), z_dir=(0, 0, -1))) as fillet_1_piece_21:
        with BuildLine():
            CenterArc((FILLET_1_R * 0.265800810182, FILLET_1_R), FILLET_1_R, 240.229818231195, 29.770181768805003)
            Line((-FILLET_1_R * 0.230721475591, FILLET_1_R * 0.131976025832), (0, 0))
            Line((0, 0), (FILLET_1_R * 0.265800810182, 0))
        make_face()
    extrude(amount=3)
    with BuildSketch(Plane(origin=(26.507913586154185, 10.000000000000002, 3), x_dir=(-0.7071067811865482, 0.7071067811865468, 0), z_dir=(0, 0, -1))) as fillet_1_piece_22:
        with BuildLine():
            CenterArc((FILLET_1_R * 0.414213562373, FILLET_1_R), FILLET_1_R, 225.00000000000006, 45.000000000000114)
            Line((-FILLET_1_R * 0.292893218813, FILLET_1_R * 0.292893218813), (0, 0))
            Line((0, 0), (FILLET_1_R * 0.414213562373, 1e-17))
        make_face()
    extrude(amount=3)
    # the kernel refuses this fillet: 3 mm, written as the material it takes off along each edge
    with BuildSketch(Plane(origin=(174.6526232336509, 54.381794914030856, 3.6717035747929345), x_dir=(-0.9634885943550205, -0.26774937637235796, 0), z_dir=(0, 0, -1))) as fillet_1_2_piece_1:
        with BuildLine():
            CenterArc((FILLET_1_R * 0.0895604766391, -FILLET_1_R), FILLET_1_R, 90.00000000000188, 10.235566175230105)
            Line((-FILLET_1_R * 0.0881351658569, -FILLET_1_R * 0.0159145064386), (0, 0))
            Line((0, 0), (FILLET_1_R * 0.0895604766391, -1e-17))
        make_face()
    extrude(amount=4.34340714958587, mode=Mode.SUBTRACT)
    with BuildSketch(Plane(origin=(185.64181138843185, 55.40022887772366, -5.916554139644239), x_dir=(0.3429596926027861, -0.9393501206950486, 0), z_dir=(0, 0, 1))) as fillet_1_2_piece_2:
        with BuildLine():
            CenterArc((2.312007309953282, -2.999502837675169), FILLET_1_R, 88.95688520370253, 76.28063656309585)
            Line((-0.5889640915743037, -2.2350651832395365), (0, 0))
            ThreePointArc((0, 0), (1.183310827928844, 0.010771850371206), (2.366621655857689, 6e-17))
        make_face()
    extrude(amount=14.833108279288478, mode=Mode.SUBTRACT)
    with BuildSketch(Plane(origin=(186.64735263363326, 11.394080625595256, -5.014960799028406), x_dir=(-0.9943411291859617, -0.10623426381910225, 0), z_dir=(0, 0, 1))) as fillet_1_2_piece_3:
        with BuildLine():
            CenterArc((1.9591455422097777, -2.9999999999999996), FILLET_1_R, 89.99999999999983, 67.1875610802881)
            ThreePointArc((-0.806191458360402, -1.8368528582859858), (-0.41018210878156197, -0.9153162297170893), (0, 0))
            Line((0, 0), (1.9591455422097865, 2e-17))
        make_face()
    extrude(amount=13.029921598056813, mode=Mode.SUBTRACT)

    # Эскиз12 → Вырез-Вытянуть4 (cut)
    with BuildSketch(Plane.XY.offset(3)):
        with Locations((124.99999999999999, 31.999999999999986)):
            Circle(SKETCH_12_R)
    extrude(amount=-CUT_EXTRUDE_4_DEPTH, mode=Mode.SUBTRACT)


solid = part.part
